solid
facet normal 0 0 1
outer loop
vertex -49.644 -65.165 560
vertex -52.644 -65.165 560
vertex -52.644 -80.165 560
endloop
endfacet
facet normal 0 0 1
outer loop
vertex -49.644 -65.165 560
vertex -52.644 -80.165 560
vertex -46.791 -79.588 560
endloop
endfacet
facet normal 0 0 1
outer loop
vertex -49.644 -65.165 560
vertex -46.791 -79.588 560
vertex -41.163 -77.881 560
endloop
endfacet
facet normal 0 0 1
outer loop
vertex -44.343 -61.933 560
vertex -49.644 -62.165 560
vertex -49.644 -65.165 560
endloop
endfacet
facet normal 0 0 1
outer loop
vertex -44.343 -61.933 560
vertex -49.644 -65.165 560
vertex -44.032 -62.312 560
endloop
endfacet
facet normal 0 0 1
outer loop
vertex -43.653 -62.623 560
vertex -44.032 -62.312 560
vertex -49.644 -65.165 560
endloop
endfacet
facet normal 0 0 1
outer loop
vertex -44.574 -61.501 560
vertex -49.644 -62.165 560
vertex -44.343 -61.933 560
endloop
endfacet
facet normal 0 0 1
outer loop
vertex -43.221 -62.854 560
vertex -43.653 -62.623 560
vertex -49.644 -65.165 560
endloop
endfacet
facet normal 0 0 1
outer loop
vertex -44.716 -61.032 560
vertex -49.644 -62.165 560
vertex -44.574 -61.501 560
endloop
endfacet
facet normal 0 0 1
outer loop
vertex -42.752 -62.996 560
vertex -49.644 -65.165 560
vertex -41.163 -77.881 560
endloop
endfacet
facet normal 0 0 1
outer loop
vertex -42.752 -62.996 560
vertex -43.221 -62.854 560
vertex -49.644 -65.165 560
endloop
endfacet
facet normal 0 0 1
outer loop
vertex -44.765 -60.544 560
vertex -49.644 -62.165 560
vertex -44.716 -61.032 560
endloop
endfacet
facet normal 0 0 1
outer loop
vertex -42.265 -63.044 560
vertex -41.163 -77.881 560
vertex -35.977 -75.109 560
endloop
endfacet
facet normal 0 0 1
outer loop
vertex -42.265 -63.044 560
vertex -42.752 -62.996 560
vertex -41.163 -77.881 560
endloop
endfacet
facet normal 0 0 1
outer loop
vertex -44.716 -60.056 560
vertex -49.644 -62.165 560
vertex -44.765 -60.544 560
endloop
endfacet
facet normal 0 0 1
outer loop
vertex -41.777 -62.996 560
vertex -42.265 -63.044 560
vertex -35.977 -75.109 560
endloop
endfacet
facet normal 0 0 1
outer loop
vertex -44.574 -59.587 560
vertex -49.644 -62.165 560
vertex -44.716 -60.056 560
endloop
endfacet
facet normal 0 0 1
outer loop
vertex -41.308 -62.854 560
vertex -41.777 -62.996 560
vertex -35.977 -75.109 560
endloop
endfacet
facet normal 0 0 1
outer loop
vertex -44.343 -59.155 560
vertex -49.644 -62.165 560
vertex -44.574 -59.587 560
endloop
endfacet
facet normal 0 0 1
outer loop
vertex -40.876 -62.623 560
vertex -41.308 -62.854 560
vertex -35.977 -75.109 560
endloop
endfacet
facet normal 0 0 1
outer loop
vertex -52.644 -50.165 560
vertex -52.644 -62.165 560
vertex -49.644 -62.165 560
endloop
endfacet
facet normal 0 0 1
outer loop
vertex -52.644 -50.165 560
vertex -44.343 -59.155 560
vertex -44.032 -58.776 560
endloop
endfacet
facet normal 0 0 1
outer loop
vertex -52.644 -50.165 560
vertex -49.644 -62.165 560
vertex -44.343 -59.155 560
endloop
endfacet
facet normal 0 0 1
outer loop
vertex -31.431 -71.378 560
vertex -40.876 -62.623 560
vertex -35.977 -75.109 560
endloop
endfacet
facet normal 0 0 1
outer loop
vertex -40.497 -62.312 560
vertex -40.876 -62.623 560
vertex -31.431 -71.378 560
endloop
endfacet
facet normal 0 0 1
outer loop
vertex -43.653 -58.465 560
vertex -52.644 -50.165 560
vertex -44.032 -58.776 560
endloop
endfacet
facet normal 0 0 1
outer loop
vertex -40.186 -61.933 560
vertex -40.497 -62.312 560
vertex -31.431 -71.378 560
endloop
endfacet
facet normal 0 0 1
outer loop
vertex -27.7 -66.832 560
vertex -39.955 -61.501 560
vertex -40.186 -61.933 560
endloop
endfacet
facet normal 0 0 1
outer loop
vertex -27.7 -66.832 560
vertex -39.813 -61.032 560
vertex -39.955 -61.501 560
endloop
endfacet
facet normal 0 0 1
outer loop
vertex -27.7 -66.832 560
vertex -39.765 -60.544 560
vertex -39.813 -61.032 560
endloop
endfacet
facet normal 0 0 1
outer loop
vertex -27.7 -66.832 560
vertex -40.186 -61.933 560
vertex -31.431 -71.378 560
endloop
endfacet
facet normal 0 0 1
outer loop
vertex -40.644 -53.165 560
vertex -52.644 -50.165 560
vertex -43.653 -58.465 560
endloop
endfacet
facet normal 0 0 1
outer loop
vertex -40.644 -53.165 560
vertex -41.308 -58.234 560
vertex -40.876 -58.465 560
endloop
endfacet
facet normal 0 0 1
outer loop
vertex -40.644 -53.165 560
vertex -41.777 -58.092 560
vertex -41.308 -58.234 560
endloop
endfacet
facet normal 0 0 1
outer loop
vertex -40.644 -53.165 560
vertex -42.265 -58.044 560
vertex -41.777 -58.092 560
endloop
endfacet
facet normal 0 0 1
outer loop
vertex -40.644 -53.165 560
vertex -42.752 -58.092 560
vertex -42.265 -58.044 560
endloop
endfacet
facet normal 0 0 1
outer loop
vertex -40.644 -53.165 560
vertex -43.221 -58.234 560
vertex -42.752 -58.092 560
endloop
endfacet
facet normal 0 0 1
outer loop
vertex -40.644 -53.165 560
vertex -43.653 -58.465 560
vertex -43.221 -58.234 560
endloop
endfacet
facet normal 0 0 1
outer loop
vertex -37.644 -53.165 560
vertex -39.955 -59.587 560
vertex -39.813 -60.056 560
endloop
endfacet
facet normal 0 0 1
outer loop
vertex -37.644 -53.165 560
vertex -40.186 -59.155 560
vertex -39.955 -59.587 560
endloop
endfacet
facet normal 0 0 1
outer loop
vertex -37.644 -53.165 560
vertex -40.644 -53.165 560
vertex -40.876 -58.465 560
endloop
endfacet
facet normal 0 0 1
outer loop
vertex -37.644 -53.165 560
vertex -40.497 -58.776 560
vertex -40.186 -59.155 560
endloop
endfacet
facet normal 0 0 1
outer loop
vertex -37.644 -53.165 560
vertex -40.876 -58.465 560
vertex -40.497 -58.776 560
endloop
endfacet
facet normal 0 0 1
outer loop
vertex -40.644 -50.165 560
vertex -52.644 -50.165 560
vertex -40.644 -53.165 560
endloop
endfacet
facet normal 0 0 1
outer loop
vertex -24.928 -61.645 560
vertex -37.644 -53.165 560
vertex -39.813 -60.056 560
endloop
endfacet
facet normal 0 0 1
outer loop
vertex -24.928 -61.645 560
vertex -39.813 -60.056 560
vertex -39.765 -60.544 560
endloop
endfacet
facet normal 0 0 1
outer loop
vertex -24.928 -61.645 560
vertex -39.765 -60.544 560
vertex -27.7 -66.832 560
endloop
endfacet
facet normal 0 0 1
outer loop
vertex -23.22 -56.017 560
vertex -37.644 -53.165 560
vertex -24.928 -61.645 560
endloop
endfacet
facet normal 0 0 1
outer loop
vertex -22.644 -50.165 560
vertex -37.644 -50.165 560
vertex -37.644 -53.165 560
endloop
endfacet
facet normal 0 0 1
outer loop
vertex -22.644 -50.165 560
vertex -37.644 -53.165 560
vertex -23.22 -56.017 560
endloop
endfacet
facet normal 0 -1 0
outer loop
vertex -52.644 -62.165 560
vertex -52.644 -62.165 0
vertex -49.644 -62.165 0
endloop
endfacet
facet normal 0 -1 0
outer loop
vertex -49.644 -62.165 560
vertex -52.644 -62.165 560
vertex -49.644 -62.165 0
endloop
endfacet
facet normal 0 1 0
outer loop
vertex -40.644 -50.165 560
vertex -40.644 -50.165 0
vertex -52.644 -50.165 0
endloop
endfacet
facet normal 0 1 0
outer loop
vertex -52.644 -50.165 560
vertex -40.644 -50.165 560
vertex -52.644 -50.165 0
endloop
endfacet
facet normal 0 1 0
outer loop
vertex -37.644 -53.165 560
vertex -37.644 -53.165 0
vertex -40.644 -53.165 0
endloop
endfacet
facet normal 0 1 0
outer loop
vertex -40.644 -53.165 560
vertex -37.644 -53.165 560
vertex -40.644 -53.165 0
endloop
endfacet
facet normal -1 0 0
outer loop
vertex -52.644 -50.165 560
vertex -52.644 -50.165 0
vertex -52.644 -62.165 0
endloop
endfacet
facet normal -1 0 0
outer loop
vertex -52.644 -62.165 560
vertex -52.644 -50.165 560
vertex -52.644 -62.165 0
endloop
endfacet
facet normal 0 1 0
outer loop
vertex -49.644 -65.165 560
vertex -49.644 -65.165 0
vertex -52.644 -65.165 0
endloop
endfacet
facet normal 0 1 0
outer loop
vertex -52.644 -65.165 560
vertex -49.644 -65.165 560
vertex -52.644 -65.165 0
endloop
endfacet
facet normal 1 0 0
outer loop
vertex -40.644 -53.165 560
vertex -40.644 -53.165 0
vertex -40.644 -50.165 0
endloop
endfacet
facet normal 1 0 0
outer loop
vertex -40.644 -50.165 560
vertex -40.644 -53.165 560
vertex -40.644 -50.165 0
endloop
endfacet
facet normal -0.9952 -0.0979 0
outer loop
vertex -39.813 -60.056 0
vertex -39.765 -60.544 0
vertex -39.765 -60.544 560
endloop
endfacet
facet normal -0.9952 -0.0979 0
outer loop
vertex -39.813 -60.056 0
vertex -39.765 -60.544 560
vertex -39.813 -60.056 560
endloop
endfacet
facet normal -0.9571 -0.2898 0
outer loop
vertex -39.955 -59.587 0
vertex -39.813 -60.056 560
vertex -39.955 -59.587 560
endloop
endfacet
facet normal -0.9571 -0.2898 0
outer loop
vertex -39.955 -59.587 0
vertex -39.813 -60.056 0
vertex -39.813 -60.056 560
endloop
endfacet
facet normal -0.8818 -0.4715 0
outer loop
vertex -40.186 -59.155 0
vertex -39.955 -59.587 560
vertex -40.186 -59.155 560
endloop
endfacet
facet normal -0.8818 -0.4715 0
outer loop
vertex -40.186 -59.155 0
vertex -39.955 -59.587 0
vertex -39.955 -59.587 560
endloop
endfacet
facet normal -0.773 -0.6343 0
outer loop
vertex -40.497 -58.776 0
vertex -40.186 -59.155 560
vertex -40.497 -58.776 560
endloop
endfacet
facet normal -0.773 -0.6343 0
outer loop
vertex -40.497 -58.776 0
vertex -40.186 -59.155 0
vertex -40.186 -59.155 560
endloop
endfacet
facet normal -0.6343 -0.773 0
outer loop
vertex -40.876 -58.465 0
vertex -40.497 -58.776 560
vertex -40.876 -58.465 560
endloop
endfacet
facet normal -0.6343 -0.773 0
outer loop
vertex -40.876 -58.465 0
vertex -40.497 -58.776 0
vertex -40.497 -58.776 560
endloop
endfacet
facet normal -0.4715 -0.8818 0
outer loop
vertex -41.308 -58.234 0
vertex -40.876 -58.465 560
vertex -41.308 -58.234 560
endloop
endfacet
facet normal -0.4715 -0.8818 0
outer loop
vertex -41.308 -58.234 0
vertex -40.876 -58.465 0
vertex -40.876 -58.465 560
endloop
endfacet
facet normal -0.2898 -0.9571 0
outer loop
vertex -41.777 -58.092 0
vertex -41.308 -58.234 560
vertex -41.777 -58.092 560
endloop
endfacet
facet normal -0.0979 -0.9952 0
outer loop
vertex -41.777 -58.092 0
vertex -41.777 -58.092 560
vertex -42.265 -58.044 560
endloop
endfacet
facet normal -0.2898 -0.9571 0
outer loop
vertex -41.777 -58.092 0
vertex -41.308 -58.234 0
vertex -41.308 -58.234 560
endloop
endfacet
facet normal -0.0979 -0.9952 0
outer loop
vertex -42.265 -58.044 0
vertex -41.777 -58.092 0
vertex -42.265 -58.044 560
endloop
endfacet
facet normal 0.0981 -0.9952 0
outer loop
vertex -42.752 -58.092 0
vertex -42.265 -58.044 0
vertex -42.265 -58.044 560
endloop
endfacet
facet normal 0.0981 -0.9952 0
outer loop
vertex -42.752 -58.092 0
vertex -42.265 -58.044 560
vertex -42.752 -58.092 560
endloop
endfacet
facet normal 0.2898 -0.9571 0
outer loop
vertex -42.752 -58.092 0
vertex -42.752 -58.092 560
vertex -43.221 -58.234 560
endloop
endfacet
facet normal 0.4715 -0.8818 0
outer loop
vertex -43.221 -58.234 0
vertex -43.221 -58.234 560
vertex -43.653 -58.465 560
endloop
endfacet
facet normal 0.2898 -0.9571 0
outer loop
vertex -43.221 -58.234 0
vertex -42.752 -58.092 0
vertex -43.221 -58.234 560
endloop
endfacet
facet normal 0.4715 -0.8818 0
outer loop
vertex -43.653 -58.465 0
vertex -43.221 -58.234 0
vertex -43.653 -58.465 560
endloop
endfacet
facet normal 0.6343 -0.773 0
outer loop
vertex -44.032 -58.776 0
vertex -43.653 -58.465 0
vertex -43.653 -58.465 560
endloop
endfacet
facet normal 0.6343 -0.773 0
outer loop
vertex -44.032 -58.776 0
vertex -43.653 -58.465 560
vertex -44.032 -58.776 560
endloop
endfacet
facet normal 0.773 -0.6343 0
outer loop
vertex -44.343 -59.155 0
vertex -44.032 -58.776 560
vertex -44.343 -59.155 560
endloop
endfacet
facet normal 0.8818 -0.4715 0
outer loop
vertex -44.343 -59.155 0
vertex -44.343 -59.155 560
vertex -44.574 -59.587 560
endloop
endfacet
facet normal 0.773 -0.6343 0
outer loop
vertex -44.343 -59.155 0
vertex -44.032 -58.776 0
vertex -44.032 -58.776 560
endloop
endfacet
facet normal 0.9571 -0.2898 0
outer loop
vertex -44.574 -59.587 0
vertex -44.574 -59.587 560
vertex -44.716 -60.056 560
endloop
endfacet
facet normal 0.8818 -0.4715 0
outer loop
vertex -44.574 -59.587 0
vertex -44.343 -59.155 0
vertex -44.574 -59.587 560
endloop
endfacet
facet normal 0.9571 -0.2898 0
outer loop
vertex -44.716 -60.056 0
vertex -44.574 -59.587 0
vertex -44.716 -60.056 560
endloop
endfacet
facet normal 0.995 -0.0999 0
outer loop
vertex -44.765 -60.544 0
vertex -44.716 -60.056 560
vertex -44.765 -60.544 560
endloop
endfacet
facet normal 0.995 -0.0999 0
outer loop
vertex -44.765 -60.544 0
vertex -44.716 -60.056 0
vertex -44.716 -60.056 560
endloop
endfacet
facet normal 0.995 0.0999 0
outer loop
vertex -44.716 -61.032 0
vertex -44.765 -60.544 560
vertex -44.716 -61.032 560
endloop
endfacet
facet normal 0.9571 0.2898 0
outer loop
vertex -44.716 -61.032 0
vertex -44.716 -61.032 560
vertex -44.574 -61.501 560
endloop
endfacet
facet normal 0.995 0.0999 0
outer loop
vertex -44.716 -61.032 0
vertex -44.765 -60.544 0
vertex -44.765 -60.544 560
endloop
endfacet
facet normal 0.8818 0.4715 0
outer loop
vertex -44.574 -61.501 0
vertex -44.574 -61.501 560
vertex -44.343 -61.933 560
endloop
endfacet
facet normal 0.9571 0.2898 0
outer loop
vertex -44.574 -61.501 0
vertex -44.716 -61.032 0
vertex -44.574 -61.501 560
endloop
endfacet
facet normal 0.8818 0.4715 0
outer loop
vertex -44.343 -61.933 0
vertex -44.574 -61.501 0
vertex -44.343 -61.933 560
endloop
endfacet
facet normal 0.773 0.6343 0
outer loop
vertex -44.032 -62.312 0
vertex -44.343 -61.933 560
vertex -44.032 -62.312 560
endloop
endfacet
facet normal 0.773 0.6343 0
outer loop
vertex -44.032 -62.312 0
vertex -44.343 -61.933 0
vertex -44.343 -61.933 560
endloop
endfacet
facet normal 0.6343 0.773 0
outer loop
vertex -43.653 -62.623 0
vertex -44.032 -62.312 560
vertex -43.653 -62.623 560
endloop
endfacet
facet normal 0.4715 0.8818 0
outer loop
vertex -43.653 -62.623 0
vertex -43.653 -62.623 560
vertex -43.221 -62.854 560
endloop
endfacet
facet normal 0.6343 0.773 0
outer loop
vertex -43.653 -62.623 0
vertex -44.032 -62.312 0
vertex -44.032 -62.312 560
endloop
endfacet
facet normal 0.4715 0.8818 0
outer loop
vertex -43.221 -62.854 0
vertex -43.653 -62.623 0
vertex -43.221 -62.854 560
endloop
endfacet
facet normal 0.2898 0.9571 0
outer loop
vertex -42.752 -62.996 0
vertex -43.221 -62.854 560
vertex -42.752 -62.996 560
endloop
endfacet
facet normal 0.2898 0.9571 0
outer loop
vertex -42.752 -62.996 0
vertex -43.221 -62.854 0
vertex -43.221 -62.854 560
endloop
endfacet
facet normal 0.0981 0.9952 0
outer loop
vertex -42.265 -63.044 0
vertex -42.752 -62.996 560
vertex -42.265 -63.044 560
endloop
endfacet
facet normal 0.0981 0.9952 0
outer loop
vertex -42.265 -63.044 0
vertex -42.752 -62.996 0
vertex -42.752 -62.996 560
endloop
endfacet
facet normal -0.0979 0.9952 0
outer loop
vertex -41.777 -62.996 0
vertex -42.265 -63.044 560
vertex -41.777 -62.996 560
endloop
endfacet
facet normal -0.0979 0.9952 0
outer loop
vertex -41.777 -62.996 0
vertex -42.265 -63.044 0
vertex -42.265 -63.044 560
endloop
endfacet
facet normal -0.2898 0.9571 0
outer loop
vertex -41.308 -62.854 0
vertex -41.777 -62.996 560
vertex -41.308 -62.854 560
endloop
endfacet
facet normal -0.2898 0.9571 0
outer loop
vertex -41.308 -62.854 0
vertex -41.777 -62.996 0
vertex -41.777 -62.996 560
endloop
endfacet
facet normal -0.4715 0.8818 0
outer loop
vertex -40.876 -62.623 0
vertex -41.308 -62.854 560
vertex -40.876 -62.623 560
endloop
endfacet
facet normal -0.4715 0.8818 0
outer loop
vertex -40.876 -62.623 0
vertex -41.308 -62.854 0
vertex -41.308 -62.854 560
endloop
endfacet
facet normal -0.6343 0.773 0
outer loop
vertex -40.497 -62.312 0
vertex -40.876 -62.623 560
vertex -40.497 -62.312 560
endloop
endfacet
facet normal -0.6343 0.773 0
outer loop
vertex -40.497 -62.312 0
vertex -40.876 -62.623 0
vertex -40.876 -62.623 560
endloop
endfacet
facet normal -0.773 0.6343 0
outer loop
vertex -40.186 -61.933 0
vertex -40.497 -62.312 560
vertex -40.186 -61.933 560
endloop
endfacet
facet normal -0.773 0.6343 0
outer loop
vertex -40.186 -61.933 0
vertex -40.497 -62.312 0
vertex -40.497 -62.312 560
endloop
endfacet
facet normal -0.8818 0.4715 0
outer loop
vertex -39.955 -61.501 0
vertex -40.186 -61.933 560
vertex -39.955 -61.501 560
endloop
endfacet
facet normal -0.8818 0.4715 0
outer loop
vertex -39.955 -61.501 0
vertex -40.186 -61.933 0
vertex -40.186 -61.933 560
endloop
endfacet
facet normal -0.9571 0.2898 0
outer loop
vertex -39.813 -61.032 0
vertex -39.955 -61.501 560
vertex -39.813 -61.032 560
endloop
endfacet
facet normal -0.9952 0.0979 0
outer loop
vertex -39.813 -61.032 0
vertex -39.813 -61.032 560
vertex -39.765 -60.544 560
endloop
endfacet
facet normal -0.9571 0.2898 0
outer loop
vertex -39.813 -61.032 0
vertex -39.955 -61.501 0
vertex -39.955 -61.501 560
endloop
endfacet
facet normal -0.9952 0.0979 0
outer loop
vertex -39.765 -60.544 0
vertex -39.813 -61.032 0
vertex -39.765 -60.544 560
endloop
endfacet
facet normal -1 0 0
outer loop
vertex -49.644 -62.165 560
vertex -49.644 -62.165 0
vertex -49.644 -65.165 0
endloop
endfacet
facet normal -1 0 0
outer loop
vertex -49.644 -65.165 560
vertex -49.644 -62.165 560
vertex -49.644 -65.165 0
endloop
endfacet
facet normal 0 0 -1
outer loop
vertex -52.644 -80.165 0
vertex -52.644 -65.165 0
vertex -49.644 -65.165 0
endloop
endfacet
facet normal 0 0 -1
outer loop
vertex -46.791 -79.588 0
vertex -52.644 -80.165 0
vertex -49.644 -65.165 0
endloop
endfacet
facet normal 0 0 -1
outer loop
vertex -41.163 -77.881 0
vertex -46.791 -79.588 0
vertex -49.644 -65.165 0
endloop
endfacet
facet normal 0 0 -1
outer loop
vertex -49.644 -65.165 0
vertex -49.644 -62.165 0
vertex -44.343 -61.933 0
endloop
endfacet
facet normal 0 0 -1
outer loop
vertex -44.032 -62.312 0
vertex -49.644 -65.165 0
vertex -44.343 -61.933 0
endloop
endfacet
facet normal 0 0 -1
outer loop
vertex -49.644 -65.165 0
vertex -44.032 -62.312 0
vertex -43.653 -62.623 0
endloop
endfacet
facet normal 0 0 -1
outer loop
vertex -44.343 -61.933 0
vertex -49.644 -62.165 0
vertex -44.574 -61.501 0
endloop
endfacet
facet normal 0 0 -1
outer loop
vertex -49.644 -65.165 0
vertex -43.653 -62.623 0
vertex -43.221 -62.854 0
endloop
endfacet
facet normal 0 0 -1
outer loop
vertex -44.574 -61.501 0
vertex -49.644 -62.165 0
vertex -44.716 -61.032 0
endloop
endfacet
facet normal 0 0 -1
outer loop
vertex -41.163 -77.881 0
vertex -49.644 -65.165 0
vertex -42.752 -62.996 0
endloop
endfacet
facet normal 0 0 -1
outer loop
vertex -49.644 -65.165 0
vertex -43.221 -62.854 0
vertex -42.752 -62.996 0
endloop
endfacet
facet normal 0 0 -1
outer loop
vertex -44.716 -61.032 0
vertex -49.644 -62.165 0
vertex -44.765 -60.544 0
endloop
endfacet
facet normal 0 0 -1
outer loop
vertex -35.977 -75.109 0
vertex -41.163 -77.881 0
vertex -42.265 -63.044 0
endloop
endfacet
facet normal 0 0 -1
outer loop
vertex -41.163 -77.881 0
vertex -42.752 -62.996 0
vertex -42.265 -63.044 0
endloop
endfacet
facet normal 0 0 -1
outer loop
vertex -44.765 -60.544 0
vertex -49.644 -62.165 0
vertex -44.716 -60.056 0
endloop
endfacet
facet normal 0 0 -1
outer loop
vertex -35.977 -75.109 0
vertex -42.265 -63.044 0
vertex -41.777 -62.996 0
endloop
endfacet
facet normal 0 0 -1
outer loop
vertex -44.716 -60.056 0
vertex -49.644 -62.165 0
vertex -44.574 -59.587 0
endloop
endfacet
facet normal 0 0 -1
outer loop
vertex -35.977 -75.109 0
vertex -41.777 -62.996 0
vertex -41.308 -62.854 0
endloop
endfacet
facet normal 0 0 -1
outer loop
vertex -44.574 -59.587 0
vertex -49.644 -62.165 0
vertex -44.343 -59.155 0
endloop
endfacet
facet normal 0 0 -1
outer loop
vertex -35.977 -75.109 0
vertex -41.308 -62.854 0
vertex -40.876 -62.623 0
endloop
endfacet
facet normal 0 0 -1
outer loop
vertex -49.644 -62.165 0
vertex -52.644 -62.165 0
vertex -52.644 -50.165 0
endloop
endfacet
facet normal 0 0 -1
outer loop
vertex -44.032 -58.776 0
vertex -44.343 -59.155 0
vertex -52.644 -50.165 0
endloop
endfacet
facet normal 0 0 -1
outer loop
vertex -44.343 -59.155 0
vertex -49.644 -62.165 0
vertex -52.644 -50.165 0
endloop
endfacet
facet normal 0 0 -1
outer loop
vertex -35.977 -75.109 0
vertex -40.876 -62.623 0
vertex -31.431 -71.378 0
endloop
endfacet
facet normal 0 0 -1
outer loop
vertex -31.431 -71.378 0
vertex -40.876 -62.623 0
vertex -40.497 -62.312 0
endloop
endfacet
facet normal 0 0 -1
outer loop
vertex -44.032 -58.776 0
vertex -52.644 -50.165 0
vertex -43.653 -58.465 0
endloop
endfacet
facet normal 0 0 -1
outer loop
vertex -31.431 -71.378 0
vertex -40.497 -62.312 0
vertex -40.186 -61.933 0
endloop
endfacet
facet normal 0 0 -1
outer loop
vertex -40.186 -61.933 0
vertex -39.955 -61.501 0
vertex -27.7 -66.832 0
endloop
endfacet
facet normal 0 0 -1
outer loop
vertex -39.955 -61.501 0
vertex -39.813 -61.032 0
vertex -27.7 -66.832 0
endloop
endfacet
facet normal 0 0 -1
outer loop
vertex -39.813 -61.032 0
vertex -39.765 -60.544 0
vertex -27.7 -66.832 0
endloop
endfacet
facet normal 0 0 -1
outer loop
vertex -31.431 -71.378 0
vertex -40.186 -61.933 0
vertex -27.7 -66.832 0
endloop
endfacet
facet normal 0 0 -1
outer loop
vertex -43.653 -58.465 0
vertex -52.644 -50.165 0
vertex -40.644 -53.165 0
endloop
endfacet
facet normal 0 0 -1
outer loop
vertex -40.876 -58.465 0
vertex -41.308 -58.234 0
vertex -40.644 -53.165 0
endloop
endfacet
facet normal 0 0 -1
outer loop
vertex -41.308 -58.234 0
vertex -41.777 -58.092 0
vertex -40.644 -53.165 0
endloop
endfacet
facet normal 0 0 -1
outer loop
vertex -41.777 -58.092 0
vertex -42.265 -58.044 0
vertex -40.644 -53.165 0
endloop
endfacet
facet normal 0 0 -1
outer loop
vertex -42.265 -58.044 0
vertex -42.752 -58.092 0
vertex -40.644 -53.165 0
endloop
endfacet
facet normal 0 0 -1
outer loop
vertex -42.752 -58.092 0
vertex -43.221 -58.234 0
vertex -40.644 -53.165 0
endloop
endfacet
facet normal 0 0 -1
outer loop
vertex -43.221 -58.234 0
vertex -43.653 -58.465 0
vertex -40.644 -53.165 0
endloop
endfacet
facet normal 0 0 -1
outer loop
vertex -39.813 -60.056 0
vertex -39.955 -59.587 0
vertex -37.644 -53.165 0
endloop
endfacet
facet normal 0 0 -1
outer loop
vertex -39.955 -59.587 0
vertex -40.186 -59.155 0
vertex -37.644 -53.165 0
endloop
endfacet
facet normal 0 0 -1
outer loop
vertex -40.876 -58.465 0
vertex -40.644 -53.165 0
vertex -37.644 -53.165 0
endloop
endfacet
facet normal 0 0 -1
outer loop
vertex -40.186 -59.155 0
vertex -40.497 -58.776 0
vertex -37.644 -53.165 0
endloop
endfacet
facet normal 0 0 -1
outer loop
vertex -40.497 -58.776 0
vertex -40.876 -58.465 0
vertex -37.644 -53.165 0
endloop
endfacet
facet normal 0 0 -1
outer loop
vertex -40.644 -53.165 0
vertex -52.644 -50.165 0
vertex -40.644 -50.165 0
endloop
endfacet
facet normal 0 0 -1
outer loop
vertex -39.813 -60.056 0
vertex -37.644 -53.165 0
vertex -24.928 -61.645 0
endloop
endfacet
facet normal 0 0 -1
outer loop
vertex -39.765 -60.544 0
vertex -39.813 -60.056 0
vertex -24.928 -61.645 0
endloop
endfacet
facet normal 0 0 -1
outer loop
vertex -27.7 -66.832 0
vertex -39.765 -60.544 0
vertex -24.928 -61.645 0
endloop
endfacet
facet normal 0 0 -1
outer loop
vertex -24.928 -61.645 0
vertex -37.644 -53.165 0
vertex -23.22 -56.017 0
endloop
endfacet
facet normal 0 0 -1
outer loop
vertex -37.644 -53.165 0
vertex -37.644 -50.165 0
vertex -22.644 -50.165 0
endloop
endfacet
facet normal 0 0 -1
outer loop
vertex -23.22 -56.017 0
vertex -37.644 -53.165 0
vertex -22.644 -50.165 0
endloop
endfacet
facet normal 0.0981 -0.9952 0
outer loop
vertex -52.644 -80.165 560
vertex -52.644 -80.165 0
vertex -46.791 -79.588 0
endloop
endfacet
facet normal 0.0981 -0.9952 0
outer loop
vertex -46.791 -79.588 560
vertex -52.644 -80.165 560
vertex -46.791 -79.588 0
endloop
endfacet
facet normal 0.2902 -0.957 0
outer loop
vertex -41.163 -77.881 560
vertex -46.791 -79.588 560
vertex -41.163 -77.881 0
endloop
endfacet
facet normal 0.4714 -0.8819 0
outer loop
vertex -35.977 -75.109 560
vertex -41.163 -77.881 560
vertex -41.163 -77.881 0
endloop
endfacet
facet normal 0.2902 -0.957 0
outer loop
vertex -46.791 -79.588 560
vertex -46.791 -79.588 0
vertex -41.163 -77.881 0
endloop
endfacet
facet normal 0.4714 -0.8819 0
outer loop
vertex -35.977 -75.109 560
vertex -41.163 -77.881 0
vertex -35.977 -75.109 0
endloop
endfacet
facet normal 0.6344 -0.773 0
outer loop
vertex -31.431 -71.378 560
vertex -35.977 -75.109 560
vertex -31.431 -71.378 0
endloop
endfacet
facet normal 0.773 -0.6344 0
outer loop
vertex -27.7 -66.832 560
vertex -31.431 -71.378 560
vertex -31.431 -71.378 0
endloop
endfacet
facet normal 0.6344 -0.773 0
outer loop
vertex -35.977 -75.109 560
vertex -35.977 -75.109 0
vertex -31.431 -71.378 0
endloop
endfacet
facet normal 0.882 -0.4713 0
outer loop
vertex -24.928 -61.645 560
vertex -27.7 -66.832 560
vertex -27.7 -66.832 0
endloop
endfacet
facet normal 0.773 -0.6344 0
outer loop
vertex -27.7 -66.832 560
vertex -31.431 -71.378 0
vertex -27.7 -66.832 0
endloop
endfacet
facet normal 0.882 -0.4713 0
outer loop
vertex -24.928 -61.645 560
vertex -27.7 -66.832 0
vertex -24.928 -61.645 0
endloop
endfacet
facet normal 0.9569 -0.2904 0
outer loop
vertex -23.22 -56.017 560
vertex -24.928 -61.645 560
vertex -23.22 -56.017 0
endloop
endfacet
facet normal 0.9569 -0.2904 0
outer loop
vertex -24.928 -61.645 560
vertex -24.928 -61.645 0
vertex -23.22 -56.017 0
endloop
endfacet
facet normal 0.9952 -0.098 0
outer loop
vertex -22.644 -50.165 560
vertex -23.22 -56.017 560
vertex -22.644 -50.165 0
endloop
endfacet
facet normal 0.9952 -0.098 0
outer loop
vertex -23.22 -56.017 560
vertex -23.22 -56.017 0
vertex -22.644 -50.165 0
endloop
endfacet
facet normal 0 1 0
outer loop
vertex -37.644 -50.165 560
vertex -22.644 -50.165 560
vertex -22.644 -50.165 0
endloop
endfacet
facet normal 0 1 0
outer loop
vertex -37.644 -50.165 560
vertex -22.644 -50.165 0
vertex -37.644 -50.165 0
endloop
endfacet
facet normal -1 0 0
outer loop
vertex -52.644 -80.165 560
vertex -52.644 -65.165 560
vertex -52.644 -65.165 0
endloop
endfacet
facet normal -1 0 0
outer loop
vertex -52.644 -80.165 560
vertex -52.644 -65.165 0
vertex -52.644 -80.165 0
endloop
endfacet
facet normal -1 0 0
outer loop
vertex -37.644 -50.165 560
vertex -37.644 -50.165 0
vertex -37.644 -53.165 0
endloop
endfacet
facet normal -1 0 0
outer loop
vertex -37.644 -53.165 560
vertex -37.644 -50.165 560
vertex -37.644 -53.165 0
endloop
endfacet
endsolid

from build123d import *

# Parameters (mm, degrees)
F0_R     = 2.5
F1_DEPTH = 560


with BuildPart() as f1:
    # F0 (on Top) → F1 (new body)
    with BuildSketch(Plane.XY):
        with BuildLine():
            Line((-40.643933, -50.164693), (-52.643933, -50.164693))
            Line((-52.643933, -50.164693), (-52.643933, -62.164693))
            Line((-52.643933, -62.164693), (-49.643933, -62.164693))
            Line((-49.643933, -62.164693), (-49.643933, -65.164693))
            Line((-49.643933, -65.164693), (-52.643933, -65.164693))
            Line((-52.643933, -65.164693), (-52.643933, -80.164693))
            ThreePointArc((-52.643933, -80.164693), (-31.43073, -71.377897), (-22.643933, -50.164693))
            Line((-22.643933, -50.164693), (-37.643933, -50.164693))
            Line((-37.643933, -50.164693), (-37.643933, -53.164693))
            Line((-37.643933, -53.164693), (-40.643933, -53.164693))
            Line((-40.643933, -53.164693), (-40.643933, -50.164693))
        make_face()
        with Locations((-42.264516, -60.54411)):
            Circle(F0_R, mode=Mode.SUBTRACT)
    extrude(amount=F1_DEPTH)


solid = f1.part
